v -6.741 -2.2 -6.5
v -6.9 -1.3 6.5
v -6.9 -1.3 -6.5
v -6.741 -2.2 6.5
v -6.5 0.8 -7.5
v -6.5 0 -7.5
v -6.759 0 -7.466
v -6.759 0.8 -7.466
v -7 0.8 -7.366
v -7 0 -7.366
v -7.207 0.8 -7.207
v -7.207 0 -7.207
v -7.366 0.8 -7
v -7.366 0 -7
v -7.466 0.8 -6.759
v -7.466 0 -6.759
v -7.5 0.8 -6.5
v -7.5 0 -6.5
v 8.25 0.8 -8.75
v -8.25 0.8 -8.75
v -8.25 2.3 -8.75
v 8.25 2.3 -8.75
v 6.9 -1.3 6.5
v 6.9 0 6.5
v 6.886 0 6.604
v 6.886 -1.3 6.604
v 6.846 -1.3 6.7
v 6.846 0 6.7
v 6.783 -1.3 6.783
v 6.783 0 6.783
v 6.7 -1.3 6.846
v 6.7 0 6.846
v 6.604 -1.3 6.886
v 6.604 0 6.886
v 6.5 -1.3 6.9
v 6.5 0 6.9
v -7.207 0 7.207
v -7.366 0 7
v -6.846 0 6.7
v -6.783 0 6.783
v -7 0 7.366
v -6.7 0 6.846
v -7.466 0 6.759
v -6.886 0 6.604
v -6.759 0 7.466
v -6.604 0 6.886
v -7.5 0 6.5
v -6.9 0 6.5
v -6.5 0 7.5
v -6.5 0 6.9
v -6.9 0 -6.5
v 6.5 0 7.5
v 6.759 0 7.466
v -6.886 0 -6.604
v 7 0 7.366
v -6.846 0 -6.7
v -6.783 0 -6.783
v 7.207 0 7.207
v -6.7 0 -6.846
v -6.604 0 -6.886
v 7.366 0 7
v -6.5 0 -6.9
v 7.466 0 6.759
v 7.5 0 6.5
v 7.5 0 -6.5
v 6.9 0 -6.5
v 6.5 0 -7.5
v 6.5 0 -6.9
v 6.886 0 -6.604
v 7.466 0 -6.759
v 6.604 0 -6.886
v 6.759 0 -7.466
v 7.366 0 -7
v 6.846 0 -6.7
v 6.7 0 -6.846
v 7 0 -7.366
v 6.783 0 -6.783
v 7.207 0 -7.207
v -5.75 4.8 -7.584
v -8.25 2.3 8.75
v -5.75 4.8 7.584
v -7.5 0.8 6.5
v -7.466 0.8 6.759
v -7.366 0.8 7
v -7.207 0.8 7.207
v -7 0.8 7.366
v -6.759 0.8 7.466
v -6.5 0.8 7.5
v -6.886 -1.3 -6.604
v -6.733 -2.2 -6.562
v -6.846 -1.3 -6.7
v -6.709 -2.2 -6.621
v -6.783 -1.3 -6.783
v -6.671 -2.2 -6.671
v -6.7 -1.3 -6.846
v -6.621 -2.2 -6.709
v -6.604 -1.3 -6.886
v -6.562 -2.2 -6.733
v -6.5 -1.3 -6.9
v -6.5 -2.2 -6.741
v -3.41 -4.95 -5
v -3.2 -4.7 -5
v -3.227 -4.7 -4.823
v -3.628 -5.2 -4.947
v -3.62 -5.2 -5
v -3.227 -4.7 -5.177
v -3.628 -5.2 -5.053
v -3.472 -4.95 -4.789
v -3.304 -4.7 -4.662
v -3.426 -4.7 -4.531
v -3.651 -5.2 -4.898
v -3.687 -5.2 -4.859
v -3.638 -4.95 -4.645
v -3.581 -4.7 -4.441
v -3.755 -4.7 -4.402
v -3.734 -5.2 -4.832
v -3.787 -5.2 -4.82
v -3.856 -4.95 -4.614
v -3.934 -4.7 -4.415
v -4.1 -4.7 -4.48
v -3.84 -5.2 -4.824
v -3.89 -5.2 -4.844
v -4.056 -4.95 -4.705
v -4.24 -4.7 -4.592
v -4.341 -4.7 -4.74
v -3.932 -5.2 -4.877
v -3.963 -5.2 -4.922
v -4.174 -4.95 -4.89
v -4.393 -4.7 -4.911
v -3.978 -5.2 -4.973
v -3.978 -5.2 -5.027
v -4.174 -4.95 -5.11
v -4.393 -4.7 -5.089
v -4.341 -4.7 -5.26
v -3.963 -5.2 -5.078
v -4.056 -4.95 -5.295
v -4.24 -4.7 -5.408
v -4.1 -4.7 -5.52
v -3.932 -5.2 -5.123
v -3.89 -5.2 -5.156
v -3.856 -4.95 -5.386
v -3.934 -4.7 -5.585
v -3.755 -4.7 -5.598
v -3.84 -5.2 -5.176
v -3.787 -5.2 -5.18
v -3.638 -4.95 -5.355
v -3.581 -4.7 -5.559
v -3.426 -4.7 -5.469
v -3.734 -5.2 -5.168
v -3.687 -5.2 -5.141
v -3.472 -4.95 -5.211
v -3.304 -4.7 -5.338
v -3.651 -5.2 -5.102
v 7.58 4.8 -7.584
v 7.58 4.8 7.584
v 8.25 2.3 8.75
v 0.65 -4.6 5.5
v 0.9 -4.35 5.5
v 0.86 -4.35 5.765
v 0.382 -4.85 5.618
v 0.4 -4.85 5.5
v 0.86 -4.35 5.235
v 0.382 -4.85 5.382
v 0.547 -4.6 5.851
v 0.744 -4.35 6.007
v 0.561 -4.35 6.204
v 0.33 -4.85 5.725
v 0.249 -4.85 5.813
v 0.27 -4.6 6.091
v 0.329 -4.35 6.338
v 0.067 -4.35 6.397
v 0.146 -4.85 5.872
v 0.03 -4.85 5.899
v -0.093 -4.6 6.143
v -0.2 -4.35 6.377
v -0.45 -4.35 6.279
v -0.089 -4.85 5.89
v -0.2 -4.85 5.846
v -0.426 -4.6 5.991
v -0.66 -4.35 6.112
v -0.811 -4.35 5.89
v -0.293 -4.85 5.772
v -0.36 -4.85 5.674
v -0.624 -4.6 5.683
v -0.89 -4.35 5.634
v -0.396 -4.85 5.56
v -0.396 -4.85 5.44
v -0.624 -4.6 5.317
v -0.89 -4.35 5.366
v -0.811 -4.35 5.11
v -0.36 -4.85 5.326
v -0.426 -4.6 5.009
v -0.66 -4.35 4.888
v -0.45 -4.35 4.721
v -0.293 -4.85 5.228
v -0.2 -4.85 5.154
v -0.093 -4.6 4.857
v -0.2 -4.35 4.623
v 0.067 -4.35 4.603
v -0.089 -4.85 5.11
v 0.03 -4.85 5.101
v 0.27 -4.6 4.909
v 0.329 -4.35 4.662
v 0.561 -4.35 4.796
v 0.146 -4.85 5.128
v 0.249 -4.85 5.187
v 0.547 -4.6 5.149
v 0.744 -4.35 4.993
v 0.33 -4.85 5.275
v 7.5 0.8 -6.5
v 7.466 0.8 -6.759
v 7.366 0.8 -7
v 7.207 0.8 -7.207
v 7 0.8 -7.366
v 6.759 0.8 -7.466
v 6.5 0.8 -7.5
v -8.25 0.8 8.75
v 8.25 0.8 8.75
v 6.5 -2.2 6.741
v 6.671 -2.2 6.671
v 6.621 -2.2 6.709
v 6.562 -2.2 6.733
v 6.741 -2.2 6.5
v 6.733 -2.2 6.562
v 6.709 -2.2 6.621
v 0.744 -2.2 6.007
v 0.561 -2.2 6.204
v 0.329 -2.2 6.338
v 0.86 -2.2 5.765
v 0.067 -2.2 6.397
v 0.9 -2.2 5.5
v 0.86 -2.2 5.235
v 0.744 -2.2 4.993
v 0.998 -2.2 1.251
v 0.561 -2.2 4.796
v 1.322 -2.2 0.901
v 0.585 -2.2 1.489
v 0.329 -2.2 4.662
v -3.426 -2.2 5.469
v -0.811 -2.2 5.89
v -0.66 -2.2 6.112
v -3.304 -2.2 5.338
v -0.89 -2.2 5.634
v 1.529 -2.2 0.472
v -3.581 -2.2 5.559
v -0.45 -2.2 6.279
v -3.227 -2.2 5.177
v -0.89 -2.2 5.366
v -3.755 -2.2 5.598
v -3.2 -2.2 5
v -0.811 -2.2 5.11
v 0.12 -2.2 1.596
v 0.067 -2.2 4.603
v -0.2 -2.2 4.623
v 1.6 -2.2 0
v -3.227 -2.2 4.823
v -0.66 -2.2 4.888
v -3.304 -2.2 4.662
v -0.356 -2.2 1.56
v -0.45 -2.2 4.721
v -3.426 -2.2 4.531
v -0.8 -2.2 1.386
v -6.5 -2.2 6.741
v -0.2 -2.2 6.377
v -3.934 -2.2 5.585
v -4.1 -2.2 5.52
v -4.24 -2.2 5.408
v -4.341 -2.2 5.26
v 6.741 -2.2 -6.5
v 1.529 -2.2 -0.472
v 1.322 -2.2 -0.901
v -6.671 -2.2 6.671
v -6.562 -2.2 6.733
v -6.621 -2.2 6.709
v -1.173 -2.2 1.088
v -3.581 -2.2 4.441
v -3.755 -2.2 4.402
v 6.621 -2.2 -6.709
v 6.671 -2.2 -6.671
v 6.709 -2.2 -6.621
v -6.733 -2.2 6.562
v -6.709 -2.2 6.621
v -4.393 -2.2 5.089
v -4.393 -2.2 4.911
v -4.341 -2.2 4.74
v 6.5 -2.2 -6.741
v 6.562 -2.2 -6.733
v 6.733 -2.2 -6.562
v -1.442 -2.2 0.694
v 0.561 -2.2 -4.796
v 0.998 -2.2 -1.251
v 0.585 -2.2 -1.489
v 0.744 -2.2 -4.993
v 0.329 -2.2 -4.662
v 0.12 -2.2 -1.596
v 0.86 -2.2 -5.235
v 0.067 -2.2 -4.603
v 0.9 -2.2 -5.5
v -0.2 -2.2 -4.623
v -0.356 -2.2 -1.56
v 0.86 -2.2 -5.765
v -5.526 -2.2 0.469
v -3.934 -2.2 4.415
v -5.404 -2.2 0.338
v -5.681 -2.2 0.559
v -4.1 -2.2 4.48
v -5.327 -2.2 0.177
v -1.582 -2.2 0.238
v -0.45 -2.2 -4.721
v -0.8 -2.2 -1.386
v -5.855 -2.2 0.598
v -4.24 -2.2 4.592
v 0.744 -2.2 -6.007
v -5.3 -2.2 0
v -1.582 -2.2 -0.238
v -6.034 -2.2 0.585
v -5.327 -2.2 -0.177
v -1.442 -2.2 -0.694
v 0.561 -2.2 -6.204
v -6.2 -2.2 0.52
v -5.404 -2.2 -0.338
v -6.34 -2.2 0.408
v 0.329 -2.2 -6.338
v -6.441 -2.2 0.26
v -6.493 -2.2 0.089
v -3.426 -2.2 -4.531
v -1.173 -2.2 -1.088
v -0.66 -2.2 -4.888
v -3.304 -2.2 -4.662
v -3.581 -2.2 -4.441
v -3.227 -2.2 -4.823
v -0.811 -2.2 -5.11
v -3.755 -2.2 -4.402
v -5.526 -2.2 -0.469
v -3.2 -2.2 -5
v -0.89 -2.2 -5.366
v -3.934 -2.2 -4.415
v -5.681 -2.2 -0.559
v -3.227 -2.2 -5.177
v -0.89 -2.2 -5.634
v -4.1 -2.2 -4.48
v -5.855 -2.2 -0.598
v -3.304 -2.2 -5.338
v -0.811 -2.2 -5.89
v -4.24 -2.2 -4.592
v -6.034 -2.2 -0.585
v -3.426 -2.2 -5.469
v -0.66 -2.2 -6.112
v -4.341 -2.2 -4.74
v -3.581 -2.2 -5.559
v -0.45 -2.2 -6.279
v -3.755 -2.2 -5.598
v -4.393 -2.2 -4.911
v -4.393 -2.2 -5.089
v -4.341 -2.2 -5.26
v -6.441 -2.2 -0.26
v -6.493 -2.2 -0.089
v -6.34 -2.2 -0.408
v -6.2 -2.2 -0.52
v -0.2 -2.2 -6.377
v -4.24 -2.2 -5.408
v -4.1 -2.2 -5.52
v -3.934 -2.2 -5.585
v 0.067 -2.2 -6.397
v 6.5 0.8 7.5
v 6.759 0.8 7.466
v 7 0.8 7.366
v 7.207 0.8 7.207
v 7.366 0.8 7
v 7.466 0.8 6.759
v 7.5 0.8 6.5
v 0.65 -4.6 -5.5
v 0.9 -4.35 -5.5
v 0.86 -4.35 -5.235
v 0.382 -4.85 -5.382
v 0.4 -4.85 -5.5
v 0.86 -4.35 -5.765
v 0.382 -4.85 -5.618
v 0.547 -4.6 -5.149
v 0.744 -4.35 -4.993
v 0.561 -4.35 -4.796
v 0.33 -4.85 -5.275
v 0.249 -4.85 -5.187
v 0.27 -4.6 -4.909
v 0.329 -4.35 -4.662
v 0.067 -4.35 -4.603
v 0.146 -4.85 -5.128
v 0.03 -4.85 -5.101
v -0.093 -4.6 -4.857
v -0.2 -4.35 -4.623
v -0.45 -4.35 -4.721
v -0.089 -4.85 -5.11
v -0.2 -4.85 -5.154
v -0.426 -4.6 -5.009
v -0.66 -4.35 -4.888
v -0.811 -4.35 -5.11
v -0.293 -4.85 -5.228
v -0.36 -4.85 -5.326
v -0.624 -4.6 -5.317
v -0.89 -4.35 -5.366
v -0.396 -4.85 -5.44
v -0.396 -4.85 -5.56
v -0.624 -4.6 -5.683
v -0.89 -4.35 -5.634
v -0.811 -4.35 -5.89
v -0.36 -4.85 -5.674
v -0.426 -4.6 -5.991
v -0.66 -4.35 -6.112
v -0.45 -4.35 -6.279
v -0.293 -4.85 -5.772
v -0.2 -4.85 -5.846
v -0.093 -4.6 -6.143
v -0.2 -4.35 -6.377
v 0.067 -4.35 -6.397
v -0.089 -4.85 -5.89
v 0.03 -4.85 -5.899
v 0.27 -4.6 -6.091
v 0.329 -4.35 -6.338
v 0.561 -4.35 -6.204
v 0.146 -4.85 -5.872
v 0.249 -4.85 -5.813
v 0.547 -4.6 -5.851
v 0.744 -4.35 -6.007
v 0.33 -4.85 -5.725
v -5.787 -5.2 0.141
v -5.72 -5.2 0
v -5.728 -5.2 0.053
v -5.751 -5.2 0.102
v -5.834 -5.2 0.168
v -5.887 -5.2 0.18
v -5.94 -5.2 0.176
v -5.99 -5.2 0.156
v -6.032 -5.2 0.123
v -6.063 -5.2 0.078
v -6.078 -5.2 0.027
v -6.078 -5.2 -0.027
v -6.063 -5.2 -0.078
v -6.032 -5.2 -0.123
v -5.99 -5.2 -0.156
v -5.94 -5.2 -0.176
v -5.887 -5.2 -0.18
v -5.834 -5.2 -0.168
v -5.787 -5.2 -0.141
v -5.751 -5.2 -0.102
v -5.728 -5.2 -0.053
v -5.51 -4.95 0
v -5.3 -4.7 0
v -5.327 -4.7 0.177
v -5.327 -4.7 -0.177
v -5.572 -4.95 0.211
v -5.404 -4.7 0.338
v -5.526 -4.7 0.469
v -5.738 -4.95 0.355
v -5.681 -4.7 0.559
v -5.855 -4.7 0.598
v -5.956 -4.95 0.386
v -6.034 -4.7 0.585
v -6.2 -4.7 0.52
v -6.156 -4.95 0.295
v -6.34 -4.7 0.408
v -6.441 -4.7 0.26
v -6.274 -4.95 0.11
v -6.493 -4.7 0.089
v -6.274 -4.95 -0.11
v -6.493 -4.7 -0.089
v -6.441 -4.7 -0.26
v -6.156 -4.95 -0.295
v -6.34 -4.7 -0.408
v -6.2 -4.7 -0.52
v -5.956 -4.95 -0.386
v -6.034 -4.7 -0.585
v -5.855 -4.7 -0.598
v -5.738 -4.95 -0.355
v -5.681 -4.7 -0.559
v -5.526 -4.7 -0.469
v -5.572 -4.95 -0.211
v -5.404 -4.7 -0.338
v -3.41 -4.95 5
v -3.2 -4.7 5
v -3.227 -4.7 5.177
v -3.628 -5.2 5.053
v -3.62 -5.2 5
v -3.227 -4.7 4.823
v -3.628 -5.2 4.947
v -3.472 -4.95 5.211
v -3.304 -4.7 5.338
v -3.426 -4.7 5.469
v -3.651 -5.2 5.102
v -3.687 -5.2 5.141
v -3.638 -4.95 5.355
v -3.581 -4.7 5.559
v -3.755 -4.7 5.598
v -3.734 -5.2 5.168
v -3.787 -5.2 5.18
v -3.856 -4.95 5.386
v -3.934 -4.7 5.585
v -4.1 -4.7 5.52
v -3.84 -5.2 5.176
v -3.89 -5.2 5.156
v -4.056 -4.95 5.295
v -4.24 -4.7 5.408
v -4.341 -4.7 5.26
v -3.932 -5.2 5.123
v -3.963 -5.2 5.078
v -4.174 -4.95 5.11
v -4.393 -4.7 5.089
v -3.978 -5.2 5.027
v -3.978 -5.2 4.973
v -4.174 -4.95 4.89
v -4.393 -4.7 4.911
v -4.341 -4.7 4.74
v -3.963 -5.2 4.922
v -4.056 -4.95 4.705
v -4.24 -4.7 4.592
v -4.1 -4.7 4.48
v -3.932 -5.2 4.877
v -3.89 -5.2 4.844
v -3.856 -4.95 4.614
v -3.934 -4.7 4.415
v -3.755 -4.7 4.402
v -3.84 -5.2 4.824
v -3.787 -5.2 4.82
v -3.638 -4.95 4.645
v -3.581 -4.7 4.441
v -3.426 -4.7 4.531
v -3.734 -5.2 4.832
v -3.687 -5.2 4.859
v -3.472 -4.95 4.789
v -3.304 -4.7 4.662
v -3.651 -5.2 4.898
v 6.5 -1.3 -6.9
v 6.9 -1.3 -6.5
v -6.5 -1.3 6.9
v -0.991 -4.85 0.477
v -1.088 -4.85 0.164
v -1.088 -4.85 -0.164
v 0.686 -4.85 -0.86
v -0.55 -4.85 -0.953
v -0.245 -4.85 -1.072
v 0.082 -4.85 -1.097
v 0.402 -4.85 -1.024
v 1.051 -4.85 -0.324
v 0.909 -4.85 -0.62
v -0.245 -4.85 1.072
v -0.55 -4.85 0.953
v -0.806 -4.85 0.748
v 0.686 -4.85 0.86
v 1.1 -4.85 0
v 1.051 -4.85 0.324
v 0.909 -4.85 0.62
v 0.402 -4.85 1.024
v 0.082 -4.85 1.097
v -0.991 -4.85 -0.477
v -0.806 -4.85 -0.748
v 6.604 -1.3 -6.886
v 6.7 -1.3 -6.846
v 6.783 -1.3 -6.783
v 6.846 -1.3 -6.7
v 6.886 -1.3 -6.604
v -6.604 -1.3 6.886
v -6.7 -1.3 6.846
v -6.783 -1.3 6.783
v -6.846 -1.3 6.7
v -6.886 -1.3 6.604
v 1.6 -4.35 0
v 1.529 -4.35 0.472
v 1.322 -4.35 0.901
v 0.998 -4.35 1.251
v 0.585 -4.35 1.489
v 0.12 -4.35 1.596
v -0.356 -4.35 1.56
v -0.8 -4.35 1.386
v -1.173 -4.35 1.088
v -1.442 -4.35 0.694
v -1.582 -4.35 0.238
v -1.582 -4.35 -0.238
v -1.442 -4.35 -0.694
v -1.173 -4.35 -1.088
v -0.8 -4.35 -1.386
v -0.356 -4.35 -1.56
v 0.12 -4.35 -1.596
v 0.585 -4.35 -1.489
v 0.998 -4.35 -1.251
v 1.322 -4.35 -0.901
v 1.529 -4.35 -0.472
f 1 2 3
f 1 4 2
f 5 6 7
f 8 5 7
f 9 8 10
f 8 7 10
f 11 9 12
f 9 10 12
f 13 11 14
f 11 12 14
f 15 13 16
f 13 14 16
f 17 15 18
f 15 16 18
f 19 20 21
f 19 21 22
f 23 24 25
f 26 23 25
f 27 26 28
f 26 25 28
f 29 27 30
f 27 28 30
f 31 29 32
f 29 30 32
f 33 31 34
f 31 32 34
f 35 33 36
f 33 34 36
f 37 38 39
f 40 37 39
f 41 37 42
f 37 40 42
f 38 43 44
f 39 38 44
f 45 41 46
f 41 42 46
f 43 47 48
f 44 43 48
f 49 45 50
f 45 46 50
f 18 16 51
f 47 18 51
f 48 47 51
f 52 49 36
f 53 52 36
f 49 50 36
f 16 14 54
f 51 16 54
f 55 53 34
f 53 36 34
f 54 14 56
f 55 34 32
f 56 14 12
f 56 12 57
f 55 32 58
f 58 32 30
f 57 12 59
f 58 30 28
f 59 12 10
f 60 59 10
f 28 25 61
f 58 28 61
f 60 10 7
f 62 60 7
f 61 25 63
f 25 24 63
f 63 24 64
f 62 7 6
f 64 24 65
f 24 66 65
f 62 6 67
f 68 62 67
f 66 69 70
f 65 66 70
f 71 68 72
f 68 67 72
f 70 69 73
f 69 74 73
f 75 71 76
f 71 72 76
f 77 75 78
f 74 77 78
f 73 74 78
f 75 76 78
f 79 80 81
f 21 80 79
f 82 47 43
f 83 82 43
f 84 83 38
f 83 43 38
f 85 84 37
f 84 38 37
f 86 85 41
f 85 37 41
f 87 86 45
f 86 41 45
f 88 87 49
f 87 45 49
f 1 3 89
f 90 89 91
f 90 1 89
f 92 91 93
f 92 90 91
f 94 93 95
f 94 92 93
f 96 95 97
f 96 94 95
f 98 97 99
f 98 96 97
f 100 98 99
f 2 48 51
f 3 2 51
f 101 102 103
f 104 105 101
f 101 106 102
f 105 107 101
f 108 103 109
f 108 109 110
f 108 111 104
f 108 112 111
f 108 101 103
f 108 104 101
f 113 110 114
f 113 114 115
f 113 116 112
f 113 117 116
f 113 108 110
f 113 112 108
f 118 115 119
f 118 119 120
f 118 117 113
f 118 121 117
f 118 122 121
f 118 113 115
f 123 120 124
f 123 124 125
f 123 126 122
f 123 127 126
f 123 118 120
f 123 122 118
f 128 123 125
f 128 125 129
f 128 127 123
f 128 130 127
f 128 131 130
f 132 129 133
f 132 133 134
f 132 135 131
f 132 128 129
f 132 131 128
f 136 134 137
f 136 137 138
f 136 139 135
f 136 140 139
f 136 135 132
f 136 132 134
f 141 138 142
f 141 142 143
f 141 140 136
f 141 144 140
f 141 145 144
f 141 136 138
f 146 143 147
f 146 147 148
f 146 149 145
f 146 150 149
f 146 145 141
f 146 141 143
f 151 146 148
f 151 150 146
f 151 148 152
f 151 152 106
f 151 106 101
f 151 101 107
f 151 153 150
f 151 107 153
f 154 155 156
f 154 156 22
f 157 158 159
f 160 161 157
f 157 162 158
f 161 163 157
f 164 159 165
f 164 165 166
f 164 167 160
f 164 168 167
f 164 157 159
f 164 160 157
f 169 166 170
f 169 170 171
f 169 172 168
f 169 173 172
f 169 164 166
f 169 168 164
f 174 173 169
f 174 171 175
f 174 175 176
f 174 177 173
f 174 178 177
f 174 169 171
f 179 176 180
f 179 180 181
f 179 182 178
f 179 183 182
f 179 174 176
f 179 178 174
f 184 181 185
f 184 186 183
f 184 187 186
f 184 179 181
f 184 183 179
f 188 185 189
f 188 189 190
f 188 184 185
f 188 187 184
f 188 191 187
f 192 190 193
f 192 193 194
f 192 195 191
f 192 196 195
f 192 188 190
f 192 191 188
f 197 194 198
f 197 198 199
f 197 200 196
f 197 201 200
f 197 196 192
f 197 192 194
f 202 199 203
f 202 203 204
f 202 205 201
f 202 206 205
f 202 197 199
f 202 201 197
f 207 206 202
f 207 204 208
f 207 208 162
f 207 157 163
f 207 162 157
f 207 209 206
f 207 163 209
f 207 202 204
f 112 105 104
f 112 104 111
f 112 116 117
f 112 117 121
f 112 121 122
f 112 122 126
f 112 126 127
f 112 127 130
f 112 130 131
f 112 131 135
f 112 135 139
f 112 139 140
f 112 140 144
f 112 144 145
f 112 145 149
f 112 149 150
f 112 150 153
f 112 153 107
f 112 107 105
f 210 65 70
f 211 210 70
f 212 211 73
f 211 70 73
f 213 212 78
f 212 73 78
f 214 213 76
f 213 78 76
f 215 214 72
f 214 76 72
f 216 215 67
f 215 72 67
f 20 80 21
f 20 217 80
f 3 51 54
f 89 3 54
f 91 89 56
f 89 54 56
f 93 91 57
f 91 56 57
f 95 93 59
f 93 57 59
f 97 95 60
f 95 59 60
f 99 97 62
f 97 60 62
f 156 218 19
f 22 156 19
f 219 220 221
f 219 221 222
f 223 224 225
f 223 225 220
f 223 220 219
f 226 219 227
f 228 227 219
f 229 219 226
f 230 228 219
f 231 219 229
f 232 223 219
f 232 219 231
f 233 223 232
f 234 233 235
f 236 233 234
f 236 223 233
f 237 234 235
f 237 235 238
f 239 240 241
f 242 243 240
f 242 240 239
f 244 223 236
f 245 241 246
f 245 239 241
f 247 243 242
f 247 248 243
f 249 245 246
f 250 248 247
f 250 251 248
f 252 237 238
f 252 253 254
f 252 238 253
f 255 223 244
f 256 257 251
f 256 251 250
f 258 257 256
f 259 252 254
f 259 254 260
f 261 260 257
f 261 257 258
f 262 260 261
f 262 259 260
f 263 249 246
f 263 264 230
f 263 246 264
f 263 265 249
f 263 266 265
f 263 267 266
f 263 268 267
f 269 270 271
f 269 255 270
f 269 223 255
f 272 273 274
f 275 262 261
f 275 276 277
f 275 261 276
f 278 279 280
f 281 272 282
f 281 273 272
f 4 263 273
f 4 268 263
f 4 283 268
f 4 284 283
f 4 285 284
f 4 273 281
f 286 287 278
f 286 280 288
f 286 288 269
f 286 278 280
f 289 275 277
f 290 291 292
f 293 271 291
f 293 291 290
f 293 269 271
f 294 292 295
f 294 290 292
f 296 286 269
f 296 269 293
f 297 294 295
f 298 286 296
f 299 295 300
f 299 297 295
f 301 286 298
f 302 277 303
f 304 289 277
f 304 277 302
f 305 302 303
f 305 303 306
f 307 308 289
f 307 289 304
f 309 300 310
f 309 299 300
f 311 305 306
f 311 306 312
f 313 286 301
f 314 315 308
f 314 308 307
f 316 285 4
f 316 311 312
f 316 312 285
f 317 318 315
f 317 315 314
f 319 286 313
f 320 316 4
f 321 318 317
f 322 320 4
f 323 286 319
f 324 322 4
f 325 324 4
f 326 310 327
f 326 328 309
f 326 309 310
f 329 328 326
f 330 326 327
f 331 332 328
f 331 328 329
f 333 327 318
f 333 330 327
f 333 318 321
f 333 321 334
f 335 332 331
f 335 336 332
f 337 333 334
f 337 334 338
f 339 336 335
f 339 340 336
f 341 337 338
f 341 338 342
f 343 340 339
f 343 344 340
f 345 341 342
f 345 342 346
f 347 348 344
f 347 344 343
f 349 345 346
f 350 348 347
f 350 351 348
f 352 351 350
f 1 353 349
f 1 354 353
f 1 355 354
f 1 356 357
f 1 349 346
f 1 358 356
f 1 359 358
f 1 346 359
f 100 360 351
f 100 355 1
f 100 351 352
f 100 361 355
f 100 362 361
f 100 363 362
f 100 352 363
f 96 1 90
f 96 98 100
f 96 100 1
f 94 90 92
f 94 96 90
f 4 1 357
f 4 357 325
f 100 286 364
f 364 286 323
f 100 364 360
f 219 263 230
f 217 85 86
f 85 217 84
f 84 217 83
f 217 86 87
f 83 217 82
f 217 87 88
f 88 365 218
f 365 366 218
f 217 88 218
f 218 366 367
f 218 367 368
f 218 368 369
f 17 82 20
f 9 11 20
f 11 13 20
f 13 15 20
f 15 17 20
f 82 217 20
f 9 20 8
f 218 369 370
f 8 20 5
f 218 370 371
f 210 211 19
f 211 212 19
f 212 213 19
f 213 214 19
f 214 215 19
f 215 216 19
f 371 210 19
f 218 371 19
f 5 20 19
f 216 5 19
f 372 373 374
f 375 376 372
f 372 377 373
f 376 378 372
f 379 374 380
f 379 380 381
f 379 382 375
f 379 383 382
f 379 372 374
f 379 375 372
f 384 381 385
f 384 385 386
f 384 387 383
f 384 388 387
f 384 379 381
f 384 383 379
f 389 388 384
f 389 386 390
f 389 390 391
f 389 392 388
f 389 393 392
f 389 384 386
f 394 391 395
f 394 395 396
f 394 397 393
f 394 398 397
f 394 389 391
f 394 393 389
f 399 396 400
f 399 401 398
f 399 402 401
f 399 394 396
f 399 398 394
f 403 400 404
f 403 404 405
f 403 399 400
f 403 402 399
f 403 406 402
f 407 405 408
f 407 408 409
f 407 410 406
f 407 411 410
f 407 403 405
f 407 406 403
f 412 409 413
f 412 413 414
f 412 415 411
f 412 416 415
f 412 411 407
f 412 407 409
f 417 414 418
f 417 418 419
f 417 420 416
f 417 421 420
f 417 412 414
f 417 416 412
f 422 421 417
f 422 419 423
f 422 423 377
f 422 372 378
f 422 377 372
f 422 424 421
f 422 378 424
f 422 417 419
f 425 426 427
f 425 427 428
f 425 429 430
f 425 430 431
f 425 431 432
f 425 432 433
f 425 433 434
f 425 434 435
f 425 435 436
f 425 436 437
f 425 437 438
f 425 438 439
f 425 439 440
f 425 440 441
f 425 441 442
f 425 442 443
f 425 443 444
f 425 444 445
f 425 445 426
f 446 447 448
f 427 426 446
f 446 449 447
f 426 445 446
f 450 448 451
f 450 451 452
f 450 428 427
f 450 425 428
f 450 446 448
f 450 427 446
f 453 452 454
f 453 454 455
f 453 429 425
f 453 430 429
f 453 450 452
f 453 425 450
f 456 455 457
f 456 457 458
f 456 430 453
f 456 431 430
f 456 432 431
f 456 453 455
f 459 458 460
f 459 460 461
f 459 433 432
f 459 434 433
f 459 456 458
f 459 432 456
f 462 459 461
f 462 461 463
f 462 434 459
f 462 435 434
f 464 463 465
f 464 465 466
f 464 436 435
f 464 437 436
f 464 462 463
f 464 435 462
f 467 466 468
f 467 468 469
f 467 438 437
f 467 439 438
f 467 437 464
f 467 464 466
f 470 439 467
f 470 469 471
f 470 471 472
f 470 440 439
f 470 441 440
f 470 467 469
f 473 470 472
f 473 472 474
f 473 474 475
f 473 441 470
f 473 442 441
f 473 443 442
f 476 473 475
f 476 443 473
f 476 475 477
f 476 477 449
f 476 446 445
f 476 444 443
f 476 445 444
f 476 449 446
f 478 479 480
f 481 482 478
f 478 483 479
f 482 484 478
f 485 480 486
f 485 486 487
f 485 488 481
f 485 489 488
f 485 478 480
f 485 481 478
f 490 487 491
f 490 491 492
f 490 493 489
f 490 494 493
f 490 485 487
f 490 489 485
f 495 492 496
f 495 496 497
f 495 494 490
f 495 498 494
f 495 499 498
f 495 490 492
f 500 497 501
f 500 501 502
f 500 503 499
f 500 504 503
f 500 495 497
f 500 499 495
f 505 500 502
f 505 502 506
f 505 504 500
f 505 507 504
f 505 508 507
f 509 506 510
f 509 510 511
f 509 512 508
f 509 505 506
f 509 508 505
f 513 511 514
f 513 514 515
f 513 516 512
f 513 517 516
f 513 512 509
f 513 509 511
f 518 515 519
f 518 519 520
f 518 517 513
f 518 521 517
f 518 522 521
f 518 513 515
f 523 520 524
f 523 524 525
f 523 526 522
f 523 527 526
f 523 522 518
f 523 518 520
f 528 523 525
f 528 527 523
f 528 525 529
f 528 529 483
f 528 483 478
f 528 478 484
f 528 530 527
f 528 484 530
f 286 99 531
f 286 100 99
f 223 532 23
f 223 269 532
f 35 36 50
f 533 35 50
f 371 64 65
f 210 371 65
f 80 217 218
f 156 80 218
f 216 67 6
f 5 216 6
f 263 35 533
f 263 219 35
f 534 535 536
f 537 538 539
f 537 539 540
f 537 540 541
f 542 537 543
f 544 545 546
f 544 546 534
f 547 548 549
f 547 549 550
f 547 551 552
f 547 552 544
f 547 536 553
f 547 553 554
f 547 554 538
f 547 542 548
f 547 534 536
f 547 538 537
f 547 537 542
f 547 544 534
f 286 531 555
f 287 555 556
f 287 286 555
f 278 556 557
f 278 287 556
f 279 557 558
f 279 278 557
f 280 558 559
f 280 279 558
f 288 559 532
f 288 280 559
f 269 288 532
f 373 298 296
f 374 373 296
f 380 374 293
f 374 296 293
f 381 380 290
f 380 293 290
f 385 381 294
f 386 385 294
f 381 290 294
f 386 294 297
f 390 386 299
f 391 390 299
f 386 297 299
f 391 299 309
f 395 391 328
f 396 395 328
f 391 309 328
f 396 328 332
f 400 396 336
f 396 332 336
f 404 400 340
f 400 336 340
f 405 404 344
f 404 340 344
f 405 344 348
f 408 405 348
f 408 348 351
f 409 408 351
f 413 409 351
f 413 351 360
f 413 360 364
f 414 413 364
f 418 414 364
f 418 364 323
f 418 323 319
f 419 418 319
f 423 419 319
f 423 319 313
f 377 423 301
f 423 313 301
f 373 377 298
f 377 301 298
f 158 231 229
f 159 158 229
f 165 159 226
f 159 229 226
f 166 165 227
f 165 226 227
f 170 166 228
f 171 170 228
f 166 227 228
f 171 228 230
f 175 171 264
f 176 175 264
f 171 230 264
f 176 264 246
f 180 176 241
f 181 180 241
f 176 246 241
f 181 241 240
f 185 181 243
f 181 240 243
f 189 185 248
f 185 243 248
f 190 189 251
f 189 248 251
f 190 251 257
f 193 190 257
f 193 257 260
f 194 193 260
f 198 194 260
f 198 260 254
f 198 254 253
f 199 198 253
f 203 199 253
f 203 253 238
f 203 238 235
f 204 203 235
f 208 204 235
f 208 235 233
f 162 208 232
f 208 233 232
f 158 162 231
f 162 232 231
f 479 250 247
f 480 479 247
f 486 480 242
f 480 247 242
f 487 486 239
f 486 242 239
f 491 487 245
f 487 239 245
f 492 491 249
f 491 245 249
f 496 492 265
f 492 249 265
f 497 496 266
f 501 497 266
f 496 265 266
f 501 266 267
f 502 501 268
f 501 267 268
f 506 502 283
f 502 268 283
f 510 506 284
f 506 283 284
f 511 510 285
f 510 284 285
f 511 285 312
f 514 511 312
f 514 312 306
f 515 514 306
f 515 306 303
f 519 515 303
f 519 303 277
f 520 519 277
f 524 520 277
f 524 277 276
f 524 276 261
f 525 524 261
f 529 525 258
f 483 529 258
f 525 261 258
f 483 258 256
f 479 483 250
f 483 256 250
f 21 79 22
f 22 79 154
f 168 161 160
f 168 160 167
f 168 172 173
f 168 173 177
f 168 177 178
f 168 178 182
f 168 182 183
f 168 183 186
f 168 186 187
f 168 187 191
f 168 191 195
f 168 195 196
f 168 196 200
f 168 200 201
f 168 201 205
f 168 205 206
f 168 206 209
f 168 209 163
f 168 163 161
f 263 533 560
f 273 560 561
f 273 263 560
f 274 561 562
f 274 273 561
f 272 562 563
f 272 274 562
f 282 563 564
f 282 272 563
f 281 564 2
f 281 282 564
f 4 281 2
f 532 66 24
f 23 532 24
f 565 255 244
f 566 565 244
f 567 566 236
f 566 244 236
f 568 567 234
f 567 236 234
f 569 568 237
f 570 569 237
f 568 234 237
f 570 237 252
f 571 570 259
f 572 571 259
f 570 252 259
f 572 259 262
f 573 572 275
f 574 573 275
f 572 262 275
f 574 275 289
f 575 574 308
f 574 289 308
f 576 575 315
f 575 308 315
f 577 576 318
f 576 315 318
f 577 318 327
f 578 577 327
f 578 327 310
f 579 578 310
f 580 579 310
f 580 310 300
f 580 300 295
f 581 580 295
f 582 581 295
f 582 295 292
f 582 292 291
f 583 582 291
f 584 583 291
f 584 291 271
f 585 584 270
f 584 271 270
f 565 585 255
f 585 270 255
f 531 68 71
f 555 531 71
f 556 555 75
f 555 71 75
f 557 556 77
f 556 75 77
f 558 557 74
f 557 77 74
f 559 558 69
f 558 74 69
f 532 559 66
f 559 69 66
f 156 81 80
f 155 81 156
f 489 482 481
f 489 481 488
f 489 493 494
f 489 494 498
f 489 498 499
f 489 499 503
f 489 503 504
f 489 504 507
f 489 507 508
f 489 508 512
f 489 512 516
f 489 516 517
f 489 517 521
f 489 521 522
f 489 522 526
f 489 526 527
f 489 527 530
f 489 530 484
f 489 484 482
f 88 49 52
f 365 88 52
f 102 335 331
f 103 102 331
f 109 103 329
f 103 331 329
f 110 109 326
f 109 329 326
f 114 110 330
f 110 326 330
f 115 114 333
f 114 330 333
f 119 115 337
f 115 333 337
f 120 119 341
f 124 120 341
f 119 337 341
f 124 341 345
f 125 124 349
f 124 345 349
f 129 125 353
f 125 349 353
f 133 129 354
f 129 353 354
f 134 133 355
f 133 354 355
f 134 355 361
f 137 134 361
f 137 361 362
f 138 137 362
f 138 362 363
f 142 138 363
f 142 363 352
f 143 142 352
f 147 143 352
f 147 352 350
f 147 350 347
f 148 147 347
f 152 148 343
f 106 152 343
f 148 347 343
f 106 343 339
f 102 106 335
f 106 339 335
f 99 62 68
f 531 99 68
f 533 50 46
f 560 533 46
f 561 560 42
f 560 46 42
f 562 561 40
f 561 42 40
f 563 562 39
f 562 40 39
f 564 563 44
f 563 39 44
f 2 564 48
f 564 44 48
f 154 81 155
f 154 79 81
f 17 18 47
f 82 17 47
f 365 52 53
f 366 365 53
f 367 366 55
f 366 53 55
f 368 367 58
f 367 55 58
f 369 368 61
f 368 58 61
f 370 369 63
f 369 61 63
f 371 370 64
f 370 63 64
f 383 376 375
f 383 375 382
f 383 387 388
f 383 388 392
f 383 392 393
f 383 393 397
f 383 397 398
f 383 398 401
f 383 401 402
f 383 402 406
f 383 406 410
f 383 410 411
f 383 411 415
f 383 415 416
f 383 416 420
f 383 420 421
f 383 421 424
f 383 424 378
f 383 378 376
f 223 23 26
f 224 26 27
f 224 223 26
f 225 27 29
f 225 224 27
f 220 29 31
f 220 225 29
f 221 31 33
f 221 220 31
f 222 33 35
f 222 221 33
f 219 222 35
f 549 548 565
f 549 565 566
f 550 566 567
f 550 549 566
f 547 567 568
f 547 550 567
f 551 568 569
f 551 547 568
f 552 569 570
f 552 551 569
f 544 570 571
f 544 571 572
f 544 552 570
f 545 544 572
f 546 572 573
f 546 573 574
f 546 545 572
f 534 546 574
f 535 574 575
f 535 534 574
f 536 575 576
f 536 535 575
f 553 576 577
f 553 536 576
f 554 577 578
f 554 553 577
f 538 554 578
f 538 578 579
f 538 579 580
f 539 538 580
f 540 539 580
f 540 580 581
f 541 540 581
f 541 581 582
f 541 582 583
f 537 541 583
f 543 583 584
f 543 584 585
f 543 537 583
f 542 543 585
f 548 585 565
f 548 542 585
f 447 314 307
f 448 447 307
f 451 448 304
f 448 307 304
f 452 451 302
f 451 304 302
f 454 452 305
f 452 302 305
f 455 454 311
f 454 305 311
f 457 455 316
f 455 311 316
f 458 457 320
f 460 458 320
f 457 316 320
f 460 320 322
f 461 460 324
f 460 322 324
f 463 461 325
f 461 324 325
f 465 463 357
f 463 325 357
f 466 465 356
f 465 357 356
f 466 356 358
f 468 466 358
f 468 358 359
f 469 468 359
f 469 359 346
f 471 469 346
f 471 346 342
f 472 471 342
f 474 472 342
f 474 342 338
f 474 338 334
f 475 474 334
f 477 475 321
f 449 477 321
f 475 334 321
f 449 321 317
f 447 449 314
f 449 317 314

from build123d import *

# Parameters (mm, degrees)
BOSS_EXTRUDE1_DEPTH   = 0.8
BOSS_EXTRUDE2_DEPTH   = 1.3
BOSS_EXTRUDE3_DEPTH   = 0.9
BOSS_EXTRUDE3_TAPER   = 10
SKETCH4_R             = 1.6
SKETCH4_R_2           = 0.9
BOSS_EXTRUDE4_DEPTH   = 2.65
SKETCH5_R             = 0.6
BOSS_EXTRUDE5_DEPTH   = 3
CHAMFER1_SIZE         = 0.5
CHAMFER1_SIZE2        = 0.419549816
CHAMFER1_PART_2_SIZE  = 0.5
CHAMFER1_PART_2_SIZE2 = 0.419549816
CHAMFER1_PART_3_SIZE  = 0.5
CHAMFER1_PART_3_SIZE2 = 0.419549816
CHAMFER2_SIZE         = 0.5
SKETCH6_W             = 16.5
SKETCH6_H             = 17.5
BOSS_EXTRUDE6_DEPTH   = 4
CHAMFER3_SIZE         = 2.5
CHAMFER3_SIZE2        = 0.669872981
CHAMFER4_SIZE         = 2.5
CHAMFER4_SIZE2        = 1.165769145
CHAMFER4_PART_2_SIZE  = 2.5
CHAMFER4_PART_2_SIZE2 = 1.165769145
CHAMFER5_SIZE         = 2.5


with BuildPart() as part:
    # Sketch1 → Boss-Extrude1 (new body)
    with BuildSketch(Plane(origin=(0, 0, 0), x_dir=(1, 0, 0), z_dir=(0, 1, 0))):
        with BuildLine():
            Line((-6.5, -7.5), (6.5, -7.5))
            ThreePointArc((6.5, -7.5), (7.207106781, -7.207106781), (7.5, -6.5))
            Line((7.5, -6.5), (7.5, 6.5))
            ThreePointArc((7.5, 6.5), (7.207106781, 7.207106781), (6.5, 7.5))
            Line((6.5, 7.5), (-6.5, 7.5))
            ThreePointArc((-6.5, 7.5), (-7.207106781, 7.207106781), (-7.5, 6.5))
            Line((-7.5, 6.5), (-7.5, -6.5))
            ThreePointArc((-7.5, -6.5), (-7.207106781, -7.207106781), (-6.5, -7.5))
        make_face()
    extrude(amount=BOSS_EXTRUDE1_DEPTH)

    # Sketch2 → Boss-Extrude2 (add)
    with BuildSketch(Plane.XZ):
        with BuildLine():
            Line((-6.9, 6.5), (-6.9, -6.5))
            ThreePointArc((-6.9, -6.5), (-6.782842712, -6.782842712), (-6.5, -6.9))
            Line((-6.5, -6.9), (6.5, -6.9))
            ThreePointArc((6.5, -6.9), (6.782842712, -6.782842712), (6.9, -6.5))
            Line((6.9, -6.5), (6.9, 6.5))
            ThreePointArc((6.9, 6.5), (6.782842712, 6.782842712), (6.5, 6.9))
            Line((6.5, 6.9), (-6.5, 6.9))
            ThreePointArc((-6.5, 6.9), (-6.782842712, 6.782842712), (-6.9, 6.5))
        make_face()
    extrude(amount=BOSS_EXTRUDE2_DEPTH)

    # Sketch3 → Boss-Extrude3 (add)
    with BuildSketch(Plane.XZ.offset(1.3)):
        with BuildLine():
            Line((-6.9, 6.5), (-6.9, -6.5))
            ThreePointArc((-6.9, -6.5), (-6.782842712, -6.782842712), (-6.5, -6.9))
            Line((-6.5, -6.9), (6.5, -6.9))
            ThreePointArc((6.5, -6.9), (6.782842712, -6.782842712), (6.9, -6.5))
            Line((6.9, -6.5), (6.9, 6.5))
            ThreePointArc((6.9, 6.5), (6.782842712, 6.782842712), (6.5, 6.9))
            Line((6.5, 6.9), (-6.5, 6.9))
            ThreePointArc((-6.5, 6.9), (-6.782842712, 6.782842712), (-6.9, 6.5))
        make_face()
    extrude(amount=BOSS_EXTRUDE3_DEPTH, taper=BOSS_EXTRUDE3_TAPER)

    # Sketch4 → Boss-Extrude4 (add)
    with BuildSketch(Plane.XZ.offset(2.2)):
        Circle(SKETCH4_R)
        with Locations((0, -5.5)):
            Circle(SKETCH4_R_2)
        with Locations((0, 5.5)):
            Circle(SKETCH4_R_2)
    extrude(amount=BOSS_EXTRUDE4_DEPTH)

    # Sketch5 → Boss-Extrude5 (add)
    with BuildSketch(Plane.XZ.offset(2.2)):
        with Locations((-5.9, 0)):
            Circle(SKETCH5_R)
        with Locations((-3.8, -5)):
            Circle(SKETCH5_R)
        with Locations((-3.8, 5)):
            Circle(SKETCH5_R)
    extrude(amount=BOSS_EXTRUDE5_DEPTH)

    # Chamfer1
    chamfer1_edges = [part.edges().sort_by_distance(p)[0] for p in [
        (-6.5, -5.2, 0),
    ]]
    chamfer1_side = [part.faces().sort_by_distance(p)[0] for p in [
        (-6.5, -3.7, 0),
    ]]
    chamfer(chamfer1_edges, length=CHAMFER1_SIZE, length2=CHAMFER1_SIZE2, reference=chamfer1_side[0])

    # Chamfer1 part 2
    chamfer1_part_2_edges = [part.edges().sort_by_distance(p)[0] for p in [
        (-4.4, -5.2, -5),
    ]]
    chamfer1_part_2_side = [part.faces().sort_by_distance(p)[0] for p in [
        (-4.4, -3.7, -5),
    ]]
    chamfer(chamfer1_part_2_edges, length=CHAMFER1_PART_2_SIZE, length2=CHAMFER1_PART_2_SIZE2, reference=chamfer1_part_2_side[0])

    # Chamfer1 part 3
    chamfer1_part_3_edges = [part.edges().sort_by_distance(p)[0] for p in [
        (-4.4, -5.2, 5),
    ]]
    chamfer1_part_3_side = [part.faces().sort_by_distance(p)[0] for p in [
        (-4.4, -3.7, 5),
    ]]
    chamfer(chamfer1_part_3_edges, length=CHAMFER1_PART_3_SIZE, length2=CHAMFER1_PART_3_SIZE2, reference=chamfer1_part_3_side[0])

    # Chamfer2
    chamfer2_edges = [part.edges().sort_by_distance(p)[0] for p in [
        (-1.6, -4.85, 0),
        (-0.9, -4.85, -5.5),
        (-0.9, -4.85, 5.5),
    ]]
    chamfer(chamfer2_edges, length=CHAMFER2_SIZE)

    # Sketch6 → Boss-Extrude6 (add)
    with BuildSketch(Plane(origin=(0, 0.8, 0), x_dir=(1, 0, 0), z_dir=(0, 1, 0))):
        Rectangle(SKETCH6_W, SKETCH6_H)
    extrude(amount=BOSS_EXTRUDE6_DEPTH)

    # Chamfer3
    chamfer3_edges = [part.edges().sort_by_distance(p)[0] for p in [
        (8.25, 4.8, 0),
    ]]
    chamfer3_side = [part.faces().sort_by_distance(p)[0] for p in [
        (8.25, 2.8, 0),
    ]]
    chamfer(chamfer3_edges, length=CHAMFER3_SIZE, length2=CHAMFER3_SIZE2, reference=chamfer3_side[0])

    # Chamfer4
    chamfer4_edges = [part.edges().sort_by_distance(p)[0] for p in [
        (-0.334936491, 4.8, -8.75),
    ]]
    chamfer4_side = [part.faces().sort_by_distance(p)[0] for p in [
        (-0.103143341, 2.785008314, -8.75),
    ]]
    chamfer(chamfer4_edges, length=CHAMFER4_SIZE, length2=CHAMFER4_SIZE2, reference=chamfer4_side[0])

    # Chamfer4 part 2
    chamfer4_part_2_edges = [part.edges().sort_by_distance(p)[0] for p in [
        (-0.334936491, 4.8, 8.75),
    ]]
    chamfer4_part_2_side = [part.faces().sort_by_distance(p)[0] for p in [
        (-0.103143341, 2.785008314, 8.75),
    ]]
    chamfer(chamfer4_part_2_edges, length=CHAMFER4_PART_2_SIZE, length2=CHAMFER4_PART_2_SIZE2, reference=chamfer4_part_2_side[0])

    # Chamfer5
    chamfer5_edges = [part.edges().sort_by_distance(p)[0] for p in [
        (-8.25, 4.8, 0),
    ]]
    chamfer(chamfer5_edges, length=CHAMFER5_SIZE)


solid = part.part
